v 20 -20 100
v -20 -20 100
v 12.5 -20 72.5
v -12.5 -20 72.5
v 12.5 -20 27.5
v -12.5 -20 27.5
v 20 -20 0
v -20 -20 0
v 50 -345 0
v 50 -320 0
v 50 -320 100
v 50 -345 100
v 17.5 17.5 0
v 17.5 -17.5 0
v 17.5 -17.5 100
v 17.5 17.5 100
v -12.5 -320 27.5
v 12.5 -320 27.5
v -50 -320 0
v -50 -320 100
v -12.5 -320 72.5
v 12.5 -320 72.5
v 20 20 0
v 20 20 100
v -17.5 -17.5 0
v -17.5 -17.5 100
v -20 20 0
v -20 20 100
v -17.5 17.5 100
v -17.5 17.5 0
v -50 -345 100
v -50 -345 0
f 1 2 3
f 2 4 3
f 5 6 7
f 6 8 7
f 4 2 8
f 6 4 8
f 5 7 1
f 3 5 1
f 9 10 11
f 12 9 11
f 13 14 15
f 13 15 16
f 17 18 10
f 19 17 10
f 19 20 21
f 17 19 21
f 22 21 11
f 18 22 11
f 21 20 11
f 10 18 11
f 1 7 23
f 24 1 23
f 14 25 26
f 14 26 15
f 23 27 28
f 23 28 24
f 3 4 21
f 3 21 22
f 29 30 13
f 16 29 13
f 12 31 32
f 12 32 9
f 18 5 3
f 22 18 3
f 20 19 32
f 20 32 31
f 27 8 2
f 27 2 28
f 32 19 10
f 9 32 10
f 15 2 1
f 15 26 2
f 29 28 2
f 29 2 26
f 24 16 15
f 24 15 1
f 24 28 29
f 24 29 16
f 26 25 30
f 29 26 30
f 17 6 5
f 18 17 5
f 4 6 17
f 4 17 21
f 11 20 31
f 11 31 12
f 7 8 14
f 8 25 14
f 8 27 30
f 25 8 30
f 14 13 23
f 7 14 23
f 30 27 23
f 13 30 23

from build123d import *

# Parameters (mm, degrees)
ESQUISSE2_W        = 40
ESQUISSE2_H        = 40
ESQUISSE2_W_2      = 35
ESQUISSE2_H_2      = 35
BOSS_EXTRU_1_DEPTH = 100
ESQUISSE3_W        = 25
ESQUISSE3_H        = 45
BOSS_EXTRU_2_DEPTH = 300
ESQUISSE4_W        = 100
ESQUISSE4_H        = 100
BOSS_EXTRU_3_DEPTH = 25


with BuildPart() as part:
    # Esquisse2 → Boss.-Extru.1 (new body)
    with BuildSketch(Plane.XY):
        Rectangle(ESQUISSE2_W, ESQUISSE2_H)
        Rectangle(ESQUISSE2_W_2, ESQUISSE2_H_2, mode=Mode.SUBTRACT)
    extrude(amount=BOSS_EXTRU_1_DEPTH)

    # Esquisse3 → Boss.-Extru.2 (add)
    with BuildSketch(Plane.XZ.offset(20)):
        with Locations((0, 50)):
            Rectangle(ESQUISSE3_W, ESQUISSE3_H)
    extrude(amount=BOSS_EXTRU_2_DEPTH)

    # Esquisse4 → Boss.-Extru.3 (add)
    with BuildSketch(Plane.XZ.offset(320)):
        with Locations((0, 50)):
            Rectangle(ESQUISSE4_W, ESQUISSE4_H)
    extrude(amount=BOSS_EXTRU_3_DEPTH)


solid = part.part
